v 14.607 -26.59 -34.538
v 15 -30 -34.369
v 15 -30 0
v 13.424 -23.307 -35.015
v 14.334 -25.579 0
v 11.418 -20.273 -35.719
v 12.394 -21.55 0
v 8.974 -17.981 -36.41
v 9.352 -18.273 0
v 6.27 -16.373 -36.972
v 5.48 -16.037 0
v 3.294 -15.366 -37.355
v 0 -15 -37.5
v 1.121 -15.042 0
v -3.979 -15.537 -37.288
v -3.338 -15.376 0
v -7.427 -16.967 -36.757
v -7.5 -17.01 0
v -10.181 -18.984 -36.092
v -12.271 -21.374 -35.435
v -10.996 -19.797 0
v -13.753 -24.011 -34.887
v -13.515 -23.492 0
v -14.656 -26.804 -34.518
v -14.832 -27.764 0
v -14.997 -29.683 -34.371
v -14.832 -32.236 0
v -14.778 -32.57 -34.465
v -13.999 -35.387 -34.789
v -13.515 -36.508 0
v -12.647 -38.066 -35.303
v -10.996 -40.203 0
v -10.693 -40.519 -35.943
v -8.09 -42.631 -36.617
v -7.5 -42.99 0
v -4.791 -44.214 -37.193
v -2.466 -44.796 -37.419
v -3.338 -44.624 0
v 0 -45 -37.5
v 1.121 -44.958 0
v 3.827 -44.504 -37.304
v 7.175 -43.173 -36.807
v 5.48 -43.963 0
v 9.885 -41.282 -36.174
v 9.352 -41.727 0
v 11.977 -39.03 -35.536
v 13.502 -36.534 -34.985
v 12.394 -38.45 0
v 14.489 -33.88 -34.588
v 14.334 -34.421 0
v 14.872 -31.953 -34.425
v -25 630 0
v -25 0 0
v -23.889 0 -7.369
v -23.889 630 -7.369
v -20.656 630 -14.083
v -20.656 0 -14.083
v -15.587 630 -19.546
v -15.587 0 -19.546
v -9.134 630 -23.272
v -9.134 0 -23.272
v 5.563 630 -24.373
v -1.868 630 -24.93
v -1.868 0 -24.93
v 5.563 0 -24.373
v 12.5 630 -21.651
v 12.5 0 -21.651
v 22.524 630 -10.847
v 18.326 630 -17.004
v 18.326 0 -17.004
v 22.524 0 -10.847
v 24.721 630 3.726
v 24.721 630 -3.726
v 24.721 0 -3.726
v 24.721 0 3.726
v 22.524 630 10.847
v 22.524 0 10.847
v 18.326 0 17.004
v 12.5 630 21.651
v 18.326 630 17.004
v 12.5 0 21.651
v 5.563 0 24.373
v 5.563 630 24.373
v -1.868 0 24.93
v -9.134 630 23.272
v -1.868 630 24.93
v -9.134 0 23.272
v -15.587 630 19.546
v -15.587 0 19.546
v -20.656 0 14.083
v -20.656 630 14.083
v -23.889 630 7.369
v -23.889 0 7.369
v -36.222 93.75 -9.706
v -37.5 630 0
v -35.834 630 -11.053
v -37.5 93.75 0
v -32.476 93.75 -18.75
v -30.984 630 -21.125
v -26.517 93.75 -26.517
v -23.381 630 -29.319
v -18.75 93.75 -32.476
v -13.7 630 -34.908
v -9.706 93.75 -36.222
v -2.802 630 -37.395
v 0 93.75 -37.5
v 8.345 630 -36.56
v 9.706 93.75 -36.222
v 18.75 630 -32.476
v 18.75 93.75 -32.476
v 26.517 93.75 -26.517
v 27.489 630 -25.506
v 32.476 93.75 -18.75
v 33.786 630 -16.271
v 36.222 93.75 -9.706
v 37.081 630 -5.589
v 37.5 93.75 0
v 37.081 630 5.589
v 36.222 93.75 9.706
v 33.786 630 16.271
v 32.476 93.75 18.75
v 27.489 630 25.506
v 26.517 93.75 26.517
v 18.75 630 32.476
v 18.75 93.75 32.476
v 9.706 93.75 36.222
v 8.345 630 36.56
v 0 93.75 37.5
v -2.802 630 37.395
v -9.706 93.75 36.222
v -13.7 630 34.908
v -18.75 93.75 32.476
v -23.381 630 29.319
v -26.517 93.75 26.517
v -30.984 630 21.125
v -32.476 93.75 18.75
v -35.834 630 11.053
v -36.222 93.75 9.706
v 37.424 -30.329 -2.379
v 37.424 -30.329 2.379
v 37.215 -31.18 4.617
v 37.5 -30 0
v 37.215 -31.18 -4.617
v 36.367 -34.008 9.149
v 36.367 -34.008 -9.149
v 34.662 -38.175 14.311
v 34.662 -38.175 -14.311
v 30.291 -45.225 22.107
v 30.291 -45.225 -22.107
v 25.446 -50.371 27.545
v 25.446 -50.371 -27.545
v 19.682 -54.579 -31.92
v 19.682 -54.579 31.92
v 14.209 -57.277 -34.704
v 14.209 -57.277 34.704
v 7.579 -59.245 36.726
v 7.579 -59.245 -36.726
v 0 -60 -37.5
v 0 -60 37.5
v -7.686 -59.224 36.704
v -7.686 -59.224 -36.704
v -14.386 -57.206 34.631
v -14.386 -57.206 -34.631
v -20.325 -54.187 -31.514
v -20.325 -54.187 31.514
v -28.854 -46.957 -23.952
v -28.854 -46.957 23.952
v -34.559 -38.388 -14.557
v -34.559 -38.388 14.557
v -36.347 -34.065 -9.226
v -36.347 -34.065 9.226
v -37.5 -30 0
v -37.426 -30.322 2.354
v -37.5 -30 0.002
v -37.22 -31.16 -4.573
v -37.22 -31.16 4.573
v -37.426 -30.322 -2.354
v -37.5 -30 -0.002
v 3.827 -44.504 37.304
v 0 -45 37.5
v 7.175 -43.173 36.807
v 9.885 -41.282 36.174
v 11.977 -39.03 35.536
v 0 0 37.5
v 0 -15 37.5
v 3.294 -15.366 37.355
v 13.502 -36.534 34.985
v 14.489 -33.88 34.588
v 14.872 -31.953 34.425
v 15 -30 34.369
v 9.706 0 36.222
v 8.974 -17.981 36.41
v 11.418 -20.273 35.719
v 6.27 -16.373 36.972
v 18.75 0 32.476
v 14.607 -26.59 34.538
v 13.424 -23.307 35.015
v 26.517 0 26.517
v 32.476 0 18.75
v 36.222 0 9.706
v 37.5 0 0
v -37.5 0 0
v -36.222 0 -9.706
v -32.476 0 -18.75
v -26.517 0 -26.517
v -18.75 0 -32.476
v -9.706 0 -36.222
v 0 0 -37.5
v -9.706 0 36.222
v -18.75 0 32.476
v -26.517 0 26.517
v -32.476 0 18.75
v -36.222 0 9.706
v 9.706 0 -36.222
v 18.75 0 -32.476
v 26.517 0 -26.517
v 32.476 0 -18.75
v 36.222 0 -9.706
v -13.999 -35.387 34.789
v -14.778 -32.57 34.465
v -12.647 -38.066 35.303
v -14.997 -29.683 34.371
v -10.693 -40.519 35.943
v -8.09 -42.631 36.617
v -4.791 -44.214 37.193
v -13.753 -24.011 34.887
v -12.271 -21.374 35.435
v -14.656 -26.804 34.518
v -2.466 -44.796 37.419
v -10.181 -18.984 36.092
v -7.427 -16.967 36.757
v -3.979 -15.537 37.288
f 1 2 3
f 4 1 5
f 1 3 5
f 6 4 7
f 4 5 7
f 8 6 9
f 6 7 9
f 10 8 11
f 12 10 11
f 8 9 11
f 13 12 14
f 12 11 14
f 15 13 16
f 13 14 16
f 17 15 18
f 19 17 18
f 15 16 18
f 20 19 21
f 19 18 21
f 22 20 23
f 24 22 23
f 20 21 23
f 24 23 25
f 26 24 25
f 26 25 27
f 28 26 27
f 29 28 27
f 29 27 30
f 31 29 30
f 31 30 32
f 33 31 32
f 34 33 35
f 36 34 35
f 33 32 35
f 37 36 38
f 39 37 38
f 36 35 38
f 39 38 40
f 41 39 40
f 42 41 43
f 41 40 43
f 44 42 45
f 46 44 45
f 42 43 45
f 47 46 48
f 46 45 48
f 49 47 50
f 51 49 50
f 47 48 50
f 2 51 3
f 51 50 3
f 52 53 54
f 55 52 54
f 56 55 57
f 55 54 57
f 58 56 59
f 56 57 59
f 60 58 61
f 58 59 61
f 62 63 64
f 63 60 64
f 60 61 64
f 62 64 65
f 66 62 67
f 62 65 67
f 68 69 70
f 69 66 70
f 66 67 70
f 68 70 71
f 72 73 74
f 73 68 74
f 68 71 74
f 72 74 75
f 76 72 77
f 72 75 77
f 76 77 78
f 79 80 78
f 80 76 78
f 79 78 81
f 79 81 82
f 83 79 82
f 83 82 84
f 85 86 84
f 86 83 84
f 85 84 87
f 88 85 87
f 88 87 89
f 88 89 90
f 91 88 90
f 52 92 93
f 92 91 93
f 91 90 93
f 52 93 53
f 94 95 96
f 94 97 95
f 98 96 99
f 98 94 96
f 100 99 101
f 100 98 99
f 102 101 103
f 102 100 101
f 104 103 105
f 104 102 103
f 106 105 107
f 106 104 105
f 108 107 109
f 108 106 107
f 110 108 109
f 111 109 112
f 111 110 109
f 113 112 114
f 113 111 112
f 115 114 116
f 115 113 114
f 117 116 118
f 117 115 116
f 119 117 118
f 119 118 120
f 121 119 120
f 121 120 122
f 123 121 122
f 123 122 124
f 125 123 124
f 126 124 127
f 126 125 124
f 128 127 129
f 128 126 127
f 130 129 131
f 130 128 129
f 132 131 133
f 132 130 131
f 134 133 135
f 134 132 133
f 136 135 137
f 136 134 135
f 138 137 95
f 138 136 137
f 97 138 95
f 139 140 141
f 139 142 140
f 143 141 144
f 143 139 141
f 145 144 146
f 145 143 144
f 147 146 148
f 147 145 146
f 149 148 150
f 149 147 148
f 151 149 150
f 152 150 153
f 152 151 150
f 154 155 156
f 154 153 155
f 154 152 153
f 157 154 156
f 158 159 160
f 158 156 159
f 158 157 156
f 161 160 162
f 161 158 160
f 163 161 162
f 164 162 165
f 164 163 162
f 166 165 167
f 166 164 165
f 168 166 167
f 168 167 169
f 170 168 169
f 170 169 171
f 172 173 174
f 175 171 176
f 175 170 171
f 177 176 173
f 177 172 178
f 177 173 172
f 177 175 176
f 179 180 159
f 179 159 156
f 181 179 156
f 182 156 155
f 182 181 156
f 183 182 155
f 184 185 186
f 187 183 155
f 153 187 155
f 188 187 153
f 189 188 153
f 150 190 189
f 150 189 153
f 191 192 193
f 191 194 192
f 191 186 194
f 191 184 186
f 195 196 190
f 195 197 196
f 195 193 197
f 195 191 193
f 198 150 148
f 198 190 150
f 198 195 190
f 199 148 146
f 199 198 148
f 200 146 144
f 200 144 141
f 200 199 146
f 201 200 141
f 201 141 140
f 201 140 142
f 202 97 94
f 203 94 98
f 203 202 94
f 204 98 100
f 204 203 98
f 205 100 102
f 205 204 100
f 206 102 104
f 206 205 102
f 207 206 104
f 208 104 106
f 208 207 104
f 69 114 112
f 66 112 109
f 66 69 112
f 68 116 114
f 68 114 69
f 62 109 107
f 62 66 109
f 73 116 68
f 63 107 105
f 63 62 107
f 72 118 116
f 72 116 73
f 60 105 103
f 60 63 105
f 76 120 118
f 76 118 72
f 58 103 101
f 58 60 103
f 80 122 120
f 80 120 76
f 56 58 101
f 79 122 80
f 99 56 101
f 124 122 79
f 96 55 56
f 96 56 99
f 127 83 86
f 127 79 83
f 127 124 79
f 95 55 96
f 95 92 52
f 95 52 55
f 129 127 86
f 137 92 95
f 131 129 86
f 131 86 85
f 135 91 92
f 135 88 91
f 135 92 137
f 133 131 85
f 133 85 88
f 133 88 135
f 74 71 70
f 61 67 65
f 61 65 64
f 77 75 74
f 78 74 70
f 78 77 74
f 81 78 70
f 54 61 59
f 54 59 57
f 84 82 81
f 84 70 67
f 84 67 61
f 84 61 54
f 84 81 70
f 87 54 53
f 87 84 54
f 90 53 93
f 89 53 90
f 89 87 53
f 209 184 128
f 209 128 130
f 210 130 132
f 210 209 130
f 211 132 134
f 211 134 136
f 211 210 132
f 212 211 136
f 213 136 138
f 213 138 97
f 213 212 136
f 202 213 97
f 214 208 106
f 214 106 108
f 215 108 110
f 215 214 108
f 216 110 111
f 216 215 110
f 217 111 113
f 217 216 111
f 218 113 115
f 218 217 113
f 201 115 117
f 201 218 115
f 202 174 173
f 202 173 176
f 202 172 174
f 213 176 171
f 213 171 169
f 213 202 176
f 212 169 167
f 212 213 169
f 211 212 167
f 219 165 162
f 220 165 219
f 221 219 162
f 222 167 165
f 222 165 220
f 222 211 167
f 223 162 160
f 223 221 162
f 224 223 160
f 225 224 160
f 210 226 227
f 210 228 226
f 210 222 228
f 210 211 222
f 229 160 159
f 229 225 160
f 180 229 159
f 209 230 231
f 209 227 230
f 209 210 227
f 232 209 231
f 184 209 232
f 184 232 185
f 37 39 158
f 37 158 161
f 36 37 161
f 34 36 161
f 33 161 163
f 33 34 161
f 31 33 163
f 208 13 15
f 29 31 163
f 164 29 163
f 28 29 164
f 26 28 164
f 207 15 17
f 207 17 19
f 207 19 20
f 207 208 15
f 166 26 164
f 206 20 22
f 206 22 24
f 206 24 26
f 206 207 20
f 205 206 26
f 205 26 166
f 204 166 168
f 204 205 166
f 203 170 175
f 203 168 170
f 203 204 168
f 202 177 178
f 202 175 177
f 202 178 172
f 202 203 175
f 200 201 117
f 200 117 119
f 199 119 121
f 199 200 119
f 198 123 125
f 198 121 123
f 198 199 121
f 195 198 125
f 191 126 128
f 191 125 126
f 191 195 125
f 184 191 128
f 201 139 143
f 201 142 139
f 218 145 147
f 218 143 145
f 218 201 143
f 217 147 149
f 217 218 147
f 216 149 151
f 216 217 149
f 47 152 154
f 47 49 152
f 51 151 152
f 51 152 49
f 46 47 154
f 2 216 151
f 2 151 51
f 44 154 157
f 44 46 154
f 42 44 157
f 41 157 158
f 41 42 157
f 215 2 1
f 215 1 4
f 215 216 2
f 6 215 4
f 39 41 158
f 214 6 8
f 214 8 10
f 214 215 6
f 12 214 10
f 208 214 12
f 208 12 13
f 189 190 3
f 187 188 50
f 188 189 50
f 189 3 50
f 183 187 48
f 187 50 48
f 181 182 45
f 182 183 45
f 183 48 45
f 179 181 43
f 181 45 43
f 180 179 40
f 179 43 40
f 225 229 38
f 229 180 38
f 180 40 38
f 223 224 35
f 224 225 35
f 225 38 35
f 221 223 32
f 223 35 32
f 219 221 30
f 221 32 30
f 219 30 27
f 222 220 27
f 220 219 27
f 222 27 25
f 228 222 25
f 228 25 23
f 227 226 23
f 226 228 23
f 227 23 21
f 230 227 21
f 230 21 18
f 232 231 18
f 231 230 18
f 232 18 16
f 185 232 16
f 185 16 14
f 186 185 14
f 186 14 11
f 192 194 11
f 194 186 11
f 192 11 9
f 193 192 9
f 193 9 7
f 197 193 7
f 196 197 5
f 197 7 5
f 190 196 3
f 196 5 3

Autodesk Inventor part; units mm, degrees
sketch "Sketch1" plane through (0, 0, 0) normal (0, 1, 0) x (-1, 0, 0)
  circle A0 centre (0, 0) radius 37.5
  circle A1 centre (0, 0) radius 25
  dimension "d0" = 75
  dimension "d1" = 50
extrude "Extrusion1" add sketch "Sketch1" along normal blind 630
sketch "Sketch2" plane through (0, 0, 0) normal (0, 1, 0) x (-1, 0, 0)
  line L0 (-37.5, -37.5) -> (37.5, -37.5)
  line L1 (37.5, -37.5) -> (37.5, 37.5)
  line L2 (37.5, 37.5) -> (-37.5, 37.5)
  line L3 (-37.5, 37.5) -> (-37.5, -37.5)
  point P0 (0, 0)
extrude "Extrusion2" add sketch "Sketch2" against normal blind 60
sketch "Sketch3" plane through (0, 0, 0) normal (0, 0, 1) x (1, 0, 0)
  circle A0 centre (0, -30) radius 15
  line L0 (-74.4823, 0) -> (79.3938, 0) projected
  line L1 (-37.5, 0) -> (-37.5, -60) projected
  line L2 (37.5, 0) -> (37.5, -60) projected
  arc A1 (-37.5, -30) -> (37.5, -30) centre (0, -21.5625) ccw
  line L3 (-37.5, -30) -> (-52.5, -30)
  line L4 (-52.5, -30) -> (-52.5, -80.2965)
  line L5 (-52.5, -80.2965) -> (57.4115, -80.2965)
  line L6 (57.4115, -80.2965) -> (57.4115, -30)
  line L7 (57.4115, -30) -> (37.5, -30)
  point P0 (0, 0)
  dimension "d6" = 30
  dimension "d7" = 30
extrude "Extrusion3" cut sketch "Sketch3" along normal mid plane 150 contours A0 | A1 L7 L6 L5 L4 L3
fillet "Fillet1" radius 37.5 4 edges at (37.5, -15, 37.5) (37.5, -15, -37.5) (-37.5, -15, 37.5) (-37.5, -15, -37.5)
properties part number "Cylinder_Bom"
